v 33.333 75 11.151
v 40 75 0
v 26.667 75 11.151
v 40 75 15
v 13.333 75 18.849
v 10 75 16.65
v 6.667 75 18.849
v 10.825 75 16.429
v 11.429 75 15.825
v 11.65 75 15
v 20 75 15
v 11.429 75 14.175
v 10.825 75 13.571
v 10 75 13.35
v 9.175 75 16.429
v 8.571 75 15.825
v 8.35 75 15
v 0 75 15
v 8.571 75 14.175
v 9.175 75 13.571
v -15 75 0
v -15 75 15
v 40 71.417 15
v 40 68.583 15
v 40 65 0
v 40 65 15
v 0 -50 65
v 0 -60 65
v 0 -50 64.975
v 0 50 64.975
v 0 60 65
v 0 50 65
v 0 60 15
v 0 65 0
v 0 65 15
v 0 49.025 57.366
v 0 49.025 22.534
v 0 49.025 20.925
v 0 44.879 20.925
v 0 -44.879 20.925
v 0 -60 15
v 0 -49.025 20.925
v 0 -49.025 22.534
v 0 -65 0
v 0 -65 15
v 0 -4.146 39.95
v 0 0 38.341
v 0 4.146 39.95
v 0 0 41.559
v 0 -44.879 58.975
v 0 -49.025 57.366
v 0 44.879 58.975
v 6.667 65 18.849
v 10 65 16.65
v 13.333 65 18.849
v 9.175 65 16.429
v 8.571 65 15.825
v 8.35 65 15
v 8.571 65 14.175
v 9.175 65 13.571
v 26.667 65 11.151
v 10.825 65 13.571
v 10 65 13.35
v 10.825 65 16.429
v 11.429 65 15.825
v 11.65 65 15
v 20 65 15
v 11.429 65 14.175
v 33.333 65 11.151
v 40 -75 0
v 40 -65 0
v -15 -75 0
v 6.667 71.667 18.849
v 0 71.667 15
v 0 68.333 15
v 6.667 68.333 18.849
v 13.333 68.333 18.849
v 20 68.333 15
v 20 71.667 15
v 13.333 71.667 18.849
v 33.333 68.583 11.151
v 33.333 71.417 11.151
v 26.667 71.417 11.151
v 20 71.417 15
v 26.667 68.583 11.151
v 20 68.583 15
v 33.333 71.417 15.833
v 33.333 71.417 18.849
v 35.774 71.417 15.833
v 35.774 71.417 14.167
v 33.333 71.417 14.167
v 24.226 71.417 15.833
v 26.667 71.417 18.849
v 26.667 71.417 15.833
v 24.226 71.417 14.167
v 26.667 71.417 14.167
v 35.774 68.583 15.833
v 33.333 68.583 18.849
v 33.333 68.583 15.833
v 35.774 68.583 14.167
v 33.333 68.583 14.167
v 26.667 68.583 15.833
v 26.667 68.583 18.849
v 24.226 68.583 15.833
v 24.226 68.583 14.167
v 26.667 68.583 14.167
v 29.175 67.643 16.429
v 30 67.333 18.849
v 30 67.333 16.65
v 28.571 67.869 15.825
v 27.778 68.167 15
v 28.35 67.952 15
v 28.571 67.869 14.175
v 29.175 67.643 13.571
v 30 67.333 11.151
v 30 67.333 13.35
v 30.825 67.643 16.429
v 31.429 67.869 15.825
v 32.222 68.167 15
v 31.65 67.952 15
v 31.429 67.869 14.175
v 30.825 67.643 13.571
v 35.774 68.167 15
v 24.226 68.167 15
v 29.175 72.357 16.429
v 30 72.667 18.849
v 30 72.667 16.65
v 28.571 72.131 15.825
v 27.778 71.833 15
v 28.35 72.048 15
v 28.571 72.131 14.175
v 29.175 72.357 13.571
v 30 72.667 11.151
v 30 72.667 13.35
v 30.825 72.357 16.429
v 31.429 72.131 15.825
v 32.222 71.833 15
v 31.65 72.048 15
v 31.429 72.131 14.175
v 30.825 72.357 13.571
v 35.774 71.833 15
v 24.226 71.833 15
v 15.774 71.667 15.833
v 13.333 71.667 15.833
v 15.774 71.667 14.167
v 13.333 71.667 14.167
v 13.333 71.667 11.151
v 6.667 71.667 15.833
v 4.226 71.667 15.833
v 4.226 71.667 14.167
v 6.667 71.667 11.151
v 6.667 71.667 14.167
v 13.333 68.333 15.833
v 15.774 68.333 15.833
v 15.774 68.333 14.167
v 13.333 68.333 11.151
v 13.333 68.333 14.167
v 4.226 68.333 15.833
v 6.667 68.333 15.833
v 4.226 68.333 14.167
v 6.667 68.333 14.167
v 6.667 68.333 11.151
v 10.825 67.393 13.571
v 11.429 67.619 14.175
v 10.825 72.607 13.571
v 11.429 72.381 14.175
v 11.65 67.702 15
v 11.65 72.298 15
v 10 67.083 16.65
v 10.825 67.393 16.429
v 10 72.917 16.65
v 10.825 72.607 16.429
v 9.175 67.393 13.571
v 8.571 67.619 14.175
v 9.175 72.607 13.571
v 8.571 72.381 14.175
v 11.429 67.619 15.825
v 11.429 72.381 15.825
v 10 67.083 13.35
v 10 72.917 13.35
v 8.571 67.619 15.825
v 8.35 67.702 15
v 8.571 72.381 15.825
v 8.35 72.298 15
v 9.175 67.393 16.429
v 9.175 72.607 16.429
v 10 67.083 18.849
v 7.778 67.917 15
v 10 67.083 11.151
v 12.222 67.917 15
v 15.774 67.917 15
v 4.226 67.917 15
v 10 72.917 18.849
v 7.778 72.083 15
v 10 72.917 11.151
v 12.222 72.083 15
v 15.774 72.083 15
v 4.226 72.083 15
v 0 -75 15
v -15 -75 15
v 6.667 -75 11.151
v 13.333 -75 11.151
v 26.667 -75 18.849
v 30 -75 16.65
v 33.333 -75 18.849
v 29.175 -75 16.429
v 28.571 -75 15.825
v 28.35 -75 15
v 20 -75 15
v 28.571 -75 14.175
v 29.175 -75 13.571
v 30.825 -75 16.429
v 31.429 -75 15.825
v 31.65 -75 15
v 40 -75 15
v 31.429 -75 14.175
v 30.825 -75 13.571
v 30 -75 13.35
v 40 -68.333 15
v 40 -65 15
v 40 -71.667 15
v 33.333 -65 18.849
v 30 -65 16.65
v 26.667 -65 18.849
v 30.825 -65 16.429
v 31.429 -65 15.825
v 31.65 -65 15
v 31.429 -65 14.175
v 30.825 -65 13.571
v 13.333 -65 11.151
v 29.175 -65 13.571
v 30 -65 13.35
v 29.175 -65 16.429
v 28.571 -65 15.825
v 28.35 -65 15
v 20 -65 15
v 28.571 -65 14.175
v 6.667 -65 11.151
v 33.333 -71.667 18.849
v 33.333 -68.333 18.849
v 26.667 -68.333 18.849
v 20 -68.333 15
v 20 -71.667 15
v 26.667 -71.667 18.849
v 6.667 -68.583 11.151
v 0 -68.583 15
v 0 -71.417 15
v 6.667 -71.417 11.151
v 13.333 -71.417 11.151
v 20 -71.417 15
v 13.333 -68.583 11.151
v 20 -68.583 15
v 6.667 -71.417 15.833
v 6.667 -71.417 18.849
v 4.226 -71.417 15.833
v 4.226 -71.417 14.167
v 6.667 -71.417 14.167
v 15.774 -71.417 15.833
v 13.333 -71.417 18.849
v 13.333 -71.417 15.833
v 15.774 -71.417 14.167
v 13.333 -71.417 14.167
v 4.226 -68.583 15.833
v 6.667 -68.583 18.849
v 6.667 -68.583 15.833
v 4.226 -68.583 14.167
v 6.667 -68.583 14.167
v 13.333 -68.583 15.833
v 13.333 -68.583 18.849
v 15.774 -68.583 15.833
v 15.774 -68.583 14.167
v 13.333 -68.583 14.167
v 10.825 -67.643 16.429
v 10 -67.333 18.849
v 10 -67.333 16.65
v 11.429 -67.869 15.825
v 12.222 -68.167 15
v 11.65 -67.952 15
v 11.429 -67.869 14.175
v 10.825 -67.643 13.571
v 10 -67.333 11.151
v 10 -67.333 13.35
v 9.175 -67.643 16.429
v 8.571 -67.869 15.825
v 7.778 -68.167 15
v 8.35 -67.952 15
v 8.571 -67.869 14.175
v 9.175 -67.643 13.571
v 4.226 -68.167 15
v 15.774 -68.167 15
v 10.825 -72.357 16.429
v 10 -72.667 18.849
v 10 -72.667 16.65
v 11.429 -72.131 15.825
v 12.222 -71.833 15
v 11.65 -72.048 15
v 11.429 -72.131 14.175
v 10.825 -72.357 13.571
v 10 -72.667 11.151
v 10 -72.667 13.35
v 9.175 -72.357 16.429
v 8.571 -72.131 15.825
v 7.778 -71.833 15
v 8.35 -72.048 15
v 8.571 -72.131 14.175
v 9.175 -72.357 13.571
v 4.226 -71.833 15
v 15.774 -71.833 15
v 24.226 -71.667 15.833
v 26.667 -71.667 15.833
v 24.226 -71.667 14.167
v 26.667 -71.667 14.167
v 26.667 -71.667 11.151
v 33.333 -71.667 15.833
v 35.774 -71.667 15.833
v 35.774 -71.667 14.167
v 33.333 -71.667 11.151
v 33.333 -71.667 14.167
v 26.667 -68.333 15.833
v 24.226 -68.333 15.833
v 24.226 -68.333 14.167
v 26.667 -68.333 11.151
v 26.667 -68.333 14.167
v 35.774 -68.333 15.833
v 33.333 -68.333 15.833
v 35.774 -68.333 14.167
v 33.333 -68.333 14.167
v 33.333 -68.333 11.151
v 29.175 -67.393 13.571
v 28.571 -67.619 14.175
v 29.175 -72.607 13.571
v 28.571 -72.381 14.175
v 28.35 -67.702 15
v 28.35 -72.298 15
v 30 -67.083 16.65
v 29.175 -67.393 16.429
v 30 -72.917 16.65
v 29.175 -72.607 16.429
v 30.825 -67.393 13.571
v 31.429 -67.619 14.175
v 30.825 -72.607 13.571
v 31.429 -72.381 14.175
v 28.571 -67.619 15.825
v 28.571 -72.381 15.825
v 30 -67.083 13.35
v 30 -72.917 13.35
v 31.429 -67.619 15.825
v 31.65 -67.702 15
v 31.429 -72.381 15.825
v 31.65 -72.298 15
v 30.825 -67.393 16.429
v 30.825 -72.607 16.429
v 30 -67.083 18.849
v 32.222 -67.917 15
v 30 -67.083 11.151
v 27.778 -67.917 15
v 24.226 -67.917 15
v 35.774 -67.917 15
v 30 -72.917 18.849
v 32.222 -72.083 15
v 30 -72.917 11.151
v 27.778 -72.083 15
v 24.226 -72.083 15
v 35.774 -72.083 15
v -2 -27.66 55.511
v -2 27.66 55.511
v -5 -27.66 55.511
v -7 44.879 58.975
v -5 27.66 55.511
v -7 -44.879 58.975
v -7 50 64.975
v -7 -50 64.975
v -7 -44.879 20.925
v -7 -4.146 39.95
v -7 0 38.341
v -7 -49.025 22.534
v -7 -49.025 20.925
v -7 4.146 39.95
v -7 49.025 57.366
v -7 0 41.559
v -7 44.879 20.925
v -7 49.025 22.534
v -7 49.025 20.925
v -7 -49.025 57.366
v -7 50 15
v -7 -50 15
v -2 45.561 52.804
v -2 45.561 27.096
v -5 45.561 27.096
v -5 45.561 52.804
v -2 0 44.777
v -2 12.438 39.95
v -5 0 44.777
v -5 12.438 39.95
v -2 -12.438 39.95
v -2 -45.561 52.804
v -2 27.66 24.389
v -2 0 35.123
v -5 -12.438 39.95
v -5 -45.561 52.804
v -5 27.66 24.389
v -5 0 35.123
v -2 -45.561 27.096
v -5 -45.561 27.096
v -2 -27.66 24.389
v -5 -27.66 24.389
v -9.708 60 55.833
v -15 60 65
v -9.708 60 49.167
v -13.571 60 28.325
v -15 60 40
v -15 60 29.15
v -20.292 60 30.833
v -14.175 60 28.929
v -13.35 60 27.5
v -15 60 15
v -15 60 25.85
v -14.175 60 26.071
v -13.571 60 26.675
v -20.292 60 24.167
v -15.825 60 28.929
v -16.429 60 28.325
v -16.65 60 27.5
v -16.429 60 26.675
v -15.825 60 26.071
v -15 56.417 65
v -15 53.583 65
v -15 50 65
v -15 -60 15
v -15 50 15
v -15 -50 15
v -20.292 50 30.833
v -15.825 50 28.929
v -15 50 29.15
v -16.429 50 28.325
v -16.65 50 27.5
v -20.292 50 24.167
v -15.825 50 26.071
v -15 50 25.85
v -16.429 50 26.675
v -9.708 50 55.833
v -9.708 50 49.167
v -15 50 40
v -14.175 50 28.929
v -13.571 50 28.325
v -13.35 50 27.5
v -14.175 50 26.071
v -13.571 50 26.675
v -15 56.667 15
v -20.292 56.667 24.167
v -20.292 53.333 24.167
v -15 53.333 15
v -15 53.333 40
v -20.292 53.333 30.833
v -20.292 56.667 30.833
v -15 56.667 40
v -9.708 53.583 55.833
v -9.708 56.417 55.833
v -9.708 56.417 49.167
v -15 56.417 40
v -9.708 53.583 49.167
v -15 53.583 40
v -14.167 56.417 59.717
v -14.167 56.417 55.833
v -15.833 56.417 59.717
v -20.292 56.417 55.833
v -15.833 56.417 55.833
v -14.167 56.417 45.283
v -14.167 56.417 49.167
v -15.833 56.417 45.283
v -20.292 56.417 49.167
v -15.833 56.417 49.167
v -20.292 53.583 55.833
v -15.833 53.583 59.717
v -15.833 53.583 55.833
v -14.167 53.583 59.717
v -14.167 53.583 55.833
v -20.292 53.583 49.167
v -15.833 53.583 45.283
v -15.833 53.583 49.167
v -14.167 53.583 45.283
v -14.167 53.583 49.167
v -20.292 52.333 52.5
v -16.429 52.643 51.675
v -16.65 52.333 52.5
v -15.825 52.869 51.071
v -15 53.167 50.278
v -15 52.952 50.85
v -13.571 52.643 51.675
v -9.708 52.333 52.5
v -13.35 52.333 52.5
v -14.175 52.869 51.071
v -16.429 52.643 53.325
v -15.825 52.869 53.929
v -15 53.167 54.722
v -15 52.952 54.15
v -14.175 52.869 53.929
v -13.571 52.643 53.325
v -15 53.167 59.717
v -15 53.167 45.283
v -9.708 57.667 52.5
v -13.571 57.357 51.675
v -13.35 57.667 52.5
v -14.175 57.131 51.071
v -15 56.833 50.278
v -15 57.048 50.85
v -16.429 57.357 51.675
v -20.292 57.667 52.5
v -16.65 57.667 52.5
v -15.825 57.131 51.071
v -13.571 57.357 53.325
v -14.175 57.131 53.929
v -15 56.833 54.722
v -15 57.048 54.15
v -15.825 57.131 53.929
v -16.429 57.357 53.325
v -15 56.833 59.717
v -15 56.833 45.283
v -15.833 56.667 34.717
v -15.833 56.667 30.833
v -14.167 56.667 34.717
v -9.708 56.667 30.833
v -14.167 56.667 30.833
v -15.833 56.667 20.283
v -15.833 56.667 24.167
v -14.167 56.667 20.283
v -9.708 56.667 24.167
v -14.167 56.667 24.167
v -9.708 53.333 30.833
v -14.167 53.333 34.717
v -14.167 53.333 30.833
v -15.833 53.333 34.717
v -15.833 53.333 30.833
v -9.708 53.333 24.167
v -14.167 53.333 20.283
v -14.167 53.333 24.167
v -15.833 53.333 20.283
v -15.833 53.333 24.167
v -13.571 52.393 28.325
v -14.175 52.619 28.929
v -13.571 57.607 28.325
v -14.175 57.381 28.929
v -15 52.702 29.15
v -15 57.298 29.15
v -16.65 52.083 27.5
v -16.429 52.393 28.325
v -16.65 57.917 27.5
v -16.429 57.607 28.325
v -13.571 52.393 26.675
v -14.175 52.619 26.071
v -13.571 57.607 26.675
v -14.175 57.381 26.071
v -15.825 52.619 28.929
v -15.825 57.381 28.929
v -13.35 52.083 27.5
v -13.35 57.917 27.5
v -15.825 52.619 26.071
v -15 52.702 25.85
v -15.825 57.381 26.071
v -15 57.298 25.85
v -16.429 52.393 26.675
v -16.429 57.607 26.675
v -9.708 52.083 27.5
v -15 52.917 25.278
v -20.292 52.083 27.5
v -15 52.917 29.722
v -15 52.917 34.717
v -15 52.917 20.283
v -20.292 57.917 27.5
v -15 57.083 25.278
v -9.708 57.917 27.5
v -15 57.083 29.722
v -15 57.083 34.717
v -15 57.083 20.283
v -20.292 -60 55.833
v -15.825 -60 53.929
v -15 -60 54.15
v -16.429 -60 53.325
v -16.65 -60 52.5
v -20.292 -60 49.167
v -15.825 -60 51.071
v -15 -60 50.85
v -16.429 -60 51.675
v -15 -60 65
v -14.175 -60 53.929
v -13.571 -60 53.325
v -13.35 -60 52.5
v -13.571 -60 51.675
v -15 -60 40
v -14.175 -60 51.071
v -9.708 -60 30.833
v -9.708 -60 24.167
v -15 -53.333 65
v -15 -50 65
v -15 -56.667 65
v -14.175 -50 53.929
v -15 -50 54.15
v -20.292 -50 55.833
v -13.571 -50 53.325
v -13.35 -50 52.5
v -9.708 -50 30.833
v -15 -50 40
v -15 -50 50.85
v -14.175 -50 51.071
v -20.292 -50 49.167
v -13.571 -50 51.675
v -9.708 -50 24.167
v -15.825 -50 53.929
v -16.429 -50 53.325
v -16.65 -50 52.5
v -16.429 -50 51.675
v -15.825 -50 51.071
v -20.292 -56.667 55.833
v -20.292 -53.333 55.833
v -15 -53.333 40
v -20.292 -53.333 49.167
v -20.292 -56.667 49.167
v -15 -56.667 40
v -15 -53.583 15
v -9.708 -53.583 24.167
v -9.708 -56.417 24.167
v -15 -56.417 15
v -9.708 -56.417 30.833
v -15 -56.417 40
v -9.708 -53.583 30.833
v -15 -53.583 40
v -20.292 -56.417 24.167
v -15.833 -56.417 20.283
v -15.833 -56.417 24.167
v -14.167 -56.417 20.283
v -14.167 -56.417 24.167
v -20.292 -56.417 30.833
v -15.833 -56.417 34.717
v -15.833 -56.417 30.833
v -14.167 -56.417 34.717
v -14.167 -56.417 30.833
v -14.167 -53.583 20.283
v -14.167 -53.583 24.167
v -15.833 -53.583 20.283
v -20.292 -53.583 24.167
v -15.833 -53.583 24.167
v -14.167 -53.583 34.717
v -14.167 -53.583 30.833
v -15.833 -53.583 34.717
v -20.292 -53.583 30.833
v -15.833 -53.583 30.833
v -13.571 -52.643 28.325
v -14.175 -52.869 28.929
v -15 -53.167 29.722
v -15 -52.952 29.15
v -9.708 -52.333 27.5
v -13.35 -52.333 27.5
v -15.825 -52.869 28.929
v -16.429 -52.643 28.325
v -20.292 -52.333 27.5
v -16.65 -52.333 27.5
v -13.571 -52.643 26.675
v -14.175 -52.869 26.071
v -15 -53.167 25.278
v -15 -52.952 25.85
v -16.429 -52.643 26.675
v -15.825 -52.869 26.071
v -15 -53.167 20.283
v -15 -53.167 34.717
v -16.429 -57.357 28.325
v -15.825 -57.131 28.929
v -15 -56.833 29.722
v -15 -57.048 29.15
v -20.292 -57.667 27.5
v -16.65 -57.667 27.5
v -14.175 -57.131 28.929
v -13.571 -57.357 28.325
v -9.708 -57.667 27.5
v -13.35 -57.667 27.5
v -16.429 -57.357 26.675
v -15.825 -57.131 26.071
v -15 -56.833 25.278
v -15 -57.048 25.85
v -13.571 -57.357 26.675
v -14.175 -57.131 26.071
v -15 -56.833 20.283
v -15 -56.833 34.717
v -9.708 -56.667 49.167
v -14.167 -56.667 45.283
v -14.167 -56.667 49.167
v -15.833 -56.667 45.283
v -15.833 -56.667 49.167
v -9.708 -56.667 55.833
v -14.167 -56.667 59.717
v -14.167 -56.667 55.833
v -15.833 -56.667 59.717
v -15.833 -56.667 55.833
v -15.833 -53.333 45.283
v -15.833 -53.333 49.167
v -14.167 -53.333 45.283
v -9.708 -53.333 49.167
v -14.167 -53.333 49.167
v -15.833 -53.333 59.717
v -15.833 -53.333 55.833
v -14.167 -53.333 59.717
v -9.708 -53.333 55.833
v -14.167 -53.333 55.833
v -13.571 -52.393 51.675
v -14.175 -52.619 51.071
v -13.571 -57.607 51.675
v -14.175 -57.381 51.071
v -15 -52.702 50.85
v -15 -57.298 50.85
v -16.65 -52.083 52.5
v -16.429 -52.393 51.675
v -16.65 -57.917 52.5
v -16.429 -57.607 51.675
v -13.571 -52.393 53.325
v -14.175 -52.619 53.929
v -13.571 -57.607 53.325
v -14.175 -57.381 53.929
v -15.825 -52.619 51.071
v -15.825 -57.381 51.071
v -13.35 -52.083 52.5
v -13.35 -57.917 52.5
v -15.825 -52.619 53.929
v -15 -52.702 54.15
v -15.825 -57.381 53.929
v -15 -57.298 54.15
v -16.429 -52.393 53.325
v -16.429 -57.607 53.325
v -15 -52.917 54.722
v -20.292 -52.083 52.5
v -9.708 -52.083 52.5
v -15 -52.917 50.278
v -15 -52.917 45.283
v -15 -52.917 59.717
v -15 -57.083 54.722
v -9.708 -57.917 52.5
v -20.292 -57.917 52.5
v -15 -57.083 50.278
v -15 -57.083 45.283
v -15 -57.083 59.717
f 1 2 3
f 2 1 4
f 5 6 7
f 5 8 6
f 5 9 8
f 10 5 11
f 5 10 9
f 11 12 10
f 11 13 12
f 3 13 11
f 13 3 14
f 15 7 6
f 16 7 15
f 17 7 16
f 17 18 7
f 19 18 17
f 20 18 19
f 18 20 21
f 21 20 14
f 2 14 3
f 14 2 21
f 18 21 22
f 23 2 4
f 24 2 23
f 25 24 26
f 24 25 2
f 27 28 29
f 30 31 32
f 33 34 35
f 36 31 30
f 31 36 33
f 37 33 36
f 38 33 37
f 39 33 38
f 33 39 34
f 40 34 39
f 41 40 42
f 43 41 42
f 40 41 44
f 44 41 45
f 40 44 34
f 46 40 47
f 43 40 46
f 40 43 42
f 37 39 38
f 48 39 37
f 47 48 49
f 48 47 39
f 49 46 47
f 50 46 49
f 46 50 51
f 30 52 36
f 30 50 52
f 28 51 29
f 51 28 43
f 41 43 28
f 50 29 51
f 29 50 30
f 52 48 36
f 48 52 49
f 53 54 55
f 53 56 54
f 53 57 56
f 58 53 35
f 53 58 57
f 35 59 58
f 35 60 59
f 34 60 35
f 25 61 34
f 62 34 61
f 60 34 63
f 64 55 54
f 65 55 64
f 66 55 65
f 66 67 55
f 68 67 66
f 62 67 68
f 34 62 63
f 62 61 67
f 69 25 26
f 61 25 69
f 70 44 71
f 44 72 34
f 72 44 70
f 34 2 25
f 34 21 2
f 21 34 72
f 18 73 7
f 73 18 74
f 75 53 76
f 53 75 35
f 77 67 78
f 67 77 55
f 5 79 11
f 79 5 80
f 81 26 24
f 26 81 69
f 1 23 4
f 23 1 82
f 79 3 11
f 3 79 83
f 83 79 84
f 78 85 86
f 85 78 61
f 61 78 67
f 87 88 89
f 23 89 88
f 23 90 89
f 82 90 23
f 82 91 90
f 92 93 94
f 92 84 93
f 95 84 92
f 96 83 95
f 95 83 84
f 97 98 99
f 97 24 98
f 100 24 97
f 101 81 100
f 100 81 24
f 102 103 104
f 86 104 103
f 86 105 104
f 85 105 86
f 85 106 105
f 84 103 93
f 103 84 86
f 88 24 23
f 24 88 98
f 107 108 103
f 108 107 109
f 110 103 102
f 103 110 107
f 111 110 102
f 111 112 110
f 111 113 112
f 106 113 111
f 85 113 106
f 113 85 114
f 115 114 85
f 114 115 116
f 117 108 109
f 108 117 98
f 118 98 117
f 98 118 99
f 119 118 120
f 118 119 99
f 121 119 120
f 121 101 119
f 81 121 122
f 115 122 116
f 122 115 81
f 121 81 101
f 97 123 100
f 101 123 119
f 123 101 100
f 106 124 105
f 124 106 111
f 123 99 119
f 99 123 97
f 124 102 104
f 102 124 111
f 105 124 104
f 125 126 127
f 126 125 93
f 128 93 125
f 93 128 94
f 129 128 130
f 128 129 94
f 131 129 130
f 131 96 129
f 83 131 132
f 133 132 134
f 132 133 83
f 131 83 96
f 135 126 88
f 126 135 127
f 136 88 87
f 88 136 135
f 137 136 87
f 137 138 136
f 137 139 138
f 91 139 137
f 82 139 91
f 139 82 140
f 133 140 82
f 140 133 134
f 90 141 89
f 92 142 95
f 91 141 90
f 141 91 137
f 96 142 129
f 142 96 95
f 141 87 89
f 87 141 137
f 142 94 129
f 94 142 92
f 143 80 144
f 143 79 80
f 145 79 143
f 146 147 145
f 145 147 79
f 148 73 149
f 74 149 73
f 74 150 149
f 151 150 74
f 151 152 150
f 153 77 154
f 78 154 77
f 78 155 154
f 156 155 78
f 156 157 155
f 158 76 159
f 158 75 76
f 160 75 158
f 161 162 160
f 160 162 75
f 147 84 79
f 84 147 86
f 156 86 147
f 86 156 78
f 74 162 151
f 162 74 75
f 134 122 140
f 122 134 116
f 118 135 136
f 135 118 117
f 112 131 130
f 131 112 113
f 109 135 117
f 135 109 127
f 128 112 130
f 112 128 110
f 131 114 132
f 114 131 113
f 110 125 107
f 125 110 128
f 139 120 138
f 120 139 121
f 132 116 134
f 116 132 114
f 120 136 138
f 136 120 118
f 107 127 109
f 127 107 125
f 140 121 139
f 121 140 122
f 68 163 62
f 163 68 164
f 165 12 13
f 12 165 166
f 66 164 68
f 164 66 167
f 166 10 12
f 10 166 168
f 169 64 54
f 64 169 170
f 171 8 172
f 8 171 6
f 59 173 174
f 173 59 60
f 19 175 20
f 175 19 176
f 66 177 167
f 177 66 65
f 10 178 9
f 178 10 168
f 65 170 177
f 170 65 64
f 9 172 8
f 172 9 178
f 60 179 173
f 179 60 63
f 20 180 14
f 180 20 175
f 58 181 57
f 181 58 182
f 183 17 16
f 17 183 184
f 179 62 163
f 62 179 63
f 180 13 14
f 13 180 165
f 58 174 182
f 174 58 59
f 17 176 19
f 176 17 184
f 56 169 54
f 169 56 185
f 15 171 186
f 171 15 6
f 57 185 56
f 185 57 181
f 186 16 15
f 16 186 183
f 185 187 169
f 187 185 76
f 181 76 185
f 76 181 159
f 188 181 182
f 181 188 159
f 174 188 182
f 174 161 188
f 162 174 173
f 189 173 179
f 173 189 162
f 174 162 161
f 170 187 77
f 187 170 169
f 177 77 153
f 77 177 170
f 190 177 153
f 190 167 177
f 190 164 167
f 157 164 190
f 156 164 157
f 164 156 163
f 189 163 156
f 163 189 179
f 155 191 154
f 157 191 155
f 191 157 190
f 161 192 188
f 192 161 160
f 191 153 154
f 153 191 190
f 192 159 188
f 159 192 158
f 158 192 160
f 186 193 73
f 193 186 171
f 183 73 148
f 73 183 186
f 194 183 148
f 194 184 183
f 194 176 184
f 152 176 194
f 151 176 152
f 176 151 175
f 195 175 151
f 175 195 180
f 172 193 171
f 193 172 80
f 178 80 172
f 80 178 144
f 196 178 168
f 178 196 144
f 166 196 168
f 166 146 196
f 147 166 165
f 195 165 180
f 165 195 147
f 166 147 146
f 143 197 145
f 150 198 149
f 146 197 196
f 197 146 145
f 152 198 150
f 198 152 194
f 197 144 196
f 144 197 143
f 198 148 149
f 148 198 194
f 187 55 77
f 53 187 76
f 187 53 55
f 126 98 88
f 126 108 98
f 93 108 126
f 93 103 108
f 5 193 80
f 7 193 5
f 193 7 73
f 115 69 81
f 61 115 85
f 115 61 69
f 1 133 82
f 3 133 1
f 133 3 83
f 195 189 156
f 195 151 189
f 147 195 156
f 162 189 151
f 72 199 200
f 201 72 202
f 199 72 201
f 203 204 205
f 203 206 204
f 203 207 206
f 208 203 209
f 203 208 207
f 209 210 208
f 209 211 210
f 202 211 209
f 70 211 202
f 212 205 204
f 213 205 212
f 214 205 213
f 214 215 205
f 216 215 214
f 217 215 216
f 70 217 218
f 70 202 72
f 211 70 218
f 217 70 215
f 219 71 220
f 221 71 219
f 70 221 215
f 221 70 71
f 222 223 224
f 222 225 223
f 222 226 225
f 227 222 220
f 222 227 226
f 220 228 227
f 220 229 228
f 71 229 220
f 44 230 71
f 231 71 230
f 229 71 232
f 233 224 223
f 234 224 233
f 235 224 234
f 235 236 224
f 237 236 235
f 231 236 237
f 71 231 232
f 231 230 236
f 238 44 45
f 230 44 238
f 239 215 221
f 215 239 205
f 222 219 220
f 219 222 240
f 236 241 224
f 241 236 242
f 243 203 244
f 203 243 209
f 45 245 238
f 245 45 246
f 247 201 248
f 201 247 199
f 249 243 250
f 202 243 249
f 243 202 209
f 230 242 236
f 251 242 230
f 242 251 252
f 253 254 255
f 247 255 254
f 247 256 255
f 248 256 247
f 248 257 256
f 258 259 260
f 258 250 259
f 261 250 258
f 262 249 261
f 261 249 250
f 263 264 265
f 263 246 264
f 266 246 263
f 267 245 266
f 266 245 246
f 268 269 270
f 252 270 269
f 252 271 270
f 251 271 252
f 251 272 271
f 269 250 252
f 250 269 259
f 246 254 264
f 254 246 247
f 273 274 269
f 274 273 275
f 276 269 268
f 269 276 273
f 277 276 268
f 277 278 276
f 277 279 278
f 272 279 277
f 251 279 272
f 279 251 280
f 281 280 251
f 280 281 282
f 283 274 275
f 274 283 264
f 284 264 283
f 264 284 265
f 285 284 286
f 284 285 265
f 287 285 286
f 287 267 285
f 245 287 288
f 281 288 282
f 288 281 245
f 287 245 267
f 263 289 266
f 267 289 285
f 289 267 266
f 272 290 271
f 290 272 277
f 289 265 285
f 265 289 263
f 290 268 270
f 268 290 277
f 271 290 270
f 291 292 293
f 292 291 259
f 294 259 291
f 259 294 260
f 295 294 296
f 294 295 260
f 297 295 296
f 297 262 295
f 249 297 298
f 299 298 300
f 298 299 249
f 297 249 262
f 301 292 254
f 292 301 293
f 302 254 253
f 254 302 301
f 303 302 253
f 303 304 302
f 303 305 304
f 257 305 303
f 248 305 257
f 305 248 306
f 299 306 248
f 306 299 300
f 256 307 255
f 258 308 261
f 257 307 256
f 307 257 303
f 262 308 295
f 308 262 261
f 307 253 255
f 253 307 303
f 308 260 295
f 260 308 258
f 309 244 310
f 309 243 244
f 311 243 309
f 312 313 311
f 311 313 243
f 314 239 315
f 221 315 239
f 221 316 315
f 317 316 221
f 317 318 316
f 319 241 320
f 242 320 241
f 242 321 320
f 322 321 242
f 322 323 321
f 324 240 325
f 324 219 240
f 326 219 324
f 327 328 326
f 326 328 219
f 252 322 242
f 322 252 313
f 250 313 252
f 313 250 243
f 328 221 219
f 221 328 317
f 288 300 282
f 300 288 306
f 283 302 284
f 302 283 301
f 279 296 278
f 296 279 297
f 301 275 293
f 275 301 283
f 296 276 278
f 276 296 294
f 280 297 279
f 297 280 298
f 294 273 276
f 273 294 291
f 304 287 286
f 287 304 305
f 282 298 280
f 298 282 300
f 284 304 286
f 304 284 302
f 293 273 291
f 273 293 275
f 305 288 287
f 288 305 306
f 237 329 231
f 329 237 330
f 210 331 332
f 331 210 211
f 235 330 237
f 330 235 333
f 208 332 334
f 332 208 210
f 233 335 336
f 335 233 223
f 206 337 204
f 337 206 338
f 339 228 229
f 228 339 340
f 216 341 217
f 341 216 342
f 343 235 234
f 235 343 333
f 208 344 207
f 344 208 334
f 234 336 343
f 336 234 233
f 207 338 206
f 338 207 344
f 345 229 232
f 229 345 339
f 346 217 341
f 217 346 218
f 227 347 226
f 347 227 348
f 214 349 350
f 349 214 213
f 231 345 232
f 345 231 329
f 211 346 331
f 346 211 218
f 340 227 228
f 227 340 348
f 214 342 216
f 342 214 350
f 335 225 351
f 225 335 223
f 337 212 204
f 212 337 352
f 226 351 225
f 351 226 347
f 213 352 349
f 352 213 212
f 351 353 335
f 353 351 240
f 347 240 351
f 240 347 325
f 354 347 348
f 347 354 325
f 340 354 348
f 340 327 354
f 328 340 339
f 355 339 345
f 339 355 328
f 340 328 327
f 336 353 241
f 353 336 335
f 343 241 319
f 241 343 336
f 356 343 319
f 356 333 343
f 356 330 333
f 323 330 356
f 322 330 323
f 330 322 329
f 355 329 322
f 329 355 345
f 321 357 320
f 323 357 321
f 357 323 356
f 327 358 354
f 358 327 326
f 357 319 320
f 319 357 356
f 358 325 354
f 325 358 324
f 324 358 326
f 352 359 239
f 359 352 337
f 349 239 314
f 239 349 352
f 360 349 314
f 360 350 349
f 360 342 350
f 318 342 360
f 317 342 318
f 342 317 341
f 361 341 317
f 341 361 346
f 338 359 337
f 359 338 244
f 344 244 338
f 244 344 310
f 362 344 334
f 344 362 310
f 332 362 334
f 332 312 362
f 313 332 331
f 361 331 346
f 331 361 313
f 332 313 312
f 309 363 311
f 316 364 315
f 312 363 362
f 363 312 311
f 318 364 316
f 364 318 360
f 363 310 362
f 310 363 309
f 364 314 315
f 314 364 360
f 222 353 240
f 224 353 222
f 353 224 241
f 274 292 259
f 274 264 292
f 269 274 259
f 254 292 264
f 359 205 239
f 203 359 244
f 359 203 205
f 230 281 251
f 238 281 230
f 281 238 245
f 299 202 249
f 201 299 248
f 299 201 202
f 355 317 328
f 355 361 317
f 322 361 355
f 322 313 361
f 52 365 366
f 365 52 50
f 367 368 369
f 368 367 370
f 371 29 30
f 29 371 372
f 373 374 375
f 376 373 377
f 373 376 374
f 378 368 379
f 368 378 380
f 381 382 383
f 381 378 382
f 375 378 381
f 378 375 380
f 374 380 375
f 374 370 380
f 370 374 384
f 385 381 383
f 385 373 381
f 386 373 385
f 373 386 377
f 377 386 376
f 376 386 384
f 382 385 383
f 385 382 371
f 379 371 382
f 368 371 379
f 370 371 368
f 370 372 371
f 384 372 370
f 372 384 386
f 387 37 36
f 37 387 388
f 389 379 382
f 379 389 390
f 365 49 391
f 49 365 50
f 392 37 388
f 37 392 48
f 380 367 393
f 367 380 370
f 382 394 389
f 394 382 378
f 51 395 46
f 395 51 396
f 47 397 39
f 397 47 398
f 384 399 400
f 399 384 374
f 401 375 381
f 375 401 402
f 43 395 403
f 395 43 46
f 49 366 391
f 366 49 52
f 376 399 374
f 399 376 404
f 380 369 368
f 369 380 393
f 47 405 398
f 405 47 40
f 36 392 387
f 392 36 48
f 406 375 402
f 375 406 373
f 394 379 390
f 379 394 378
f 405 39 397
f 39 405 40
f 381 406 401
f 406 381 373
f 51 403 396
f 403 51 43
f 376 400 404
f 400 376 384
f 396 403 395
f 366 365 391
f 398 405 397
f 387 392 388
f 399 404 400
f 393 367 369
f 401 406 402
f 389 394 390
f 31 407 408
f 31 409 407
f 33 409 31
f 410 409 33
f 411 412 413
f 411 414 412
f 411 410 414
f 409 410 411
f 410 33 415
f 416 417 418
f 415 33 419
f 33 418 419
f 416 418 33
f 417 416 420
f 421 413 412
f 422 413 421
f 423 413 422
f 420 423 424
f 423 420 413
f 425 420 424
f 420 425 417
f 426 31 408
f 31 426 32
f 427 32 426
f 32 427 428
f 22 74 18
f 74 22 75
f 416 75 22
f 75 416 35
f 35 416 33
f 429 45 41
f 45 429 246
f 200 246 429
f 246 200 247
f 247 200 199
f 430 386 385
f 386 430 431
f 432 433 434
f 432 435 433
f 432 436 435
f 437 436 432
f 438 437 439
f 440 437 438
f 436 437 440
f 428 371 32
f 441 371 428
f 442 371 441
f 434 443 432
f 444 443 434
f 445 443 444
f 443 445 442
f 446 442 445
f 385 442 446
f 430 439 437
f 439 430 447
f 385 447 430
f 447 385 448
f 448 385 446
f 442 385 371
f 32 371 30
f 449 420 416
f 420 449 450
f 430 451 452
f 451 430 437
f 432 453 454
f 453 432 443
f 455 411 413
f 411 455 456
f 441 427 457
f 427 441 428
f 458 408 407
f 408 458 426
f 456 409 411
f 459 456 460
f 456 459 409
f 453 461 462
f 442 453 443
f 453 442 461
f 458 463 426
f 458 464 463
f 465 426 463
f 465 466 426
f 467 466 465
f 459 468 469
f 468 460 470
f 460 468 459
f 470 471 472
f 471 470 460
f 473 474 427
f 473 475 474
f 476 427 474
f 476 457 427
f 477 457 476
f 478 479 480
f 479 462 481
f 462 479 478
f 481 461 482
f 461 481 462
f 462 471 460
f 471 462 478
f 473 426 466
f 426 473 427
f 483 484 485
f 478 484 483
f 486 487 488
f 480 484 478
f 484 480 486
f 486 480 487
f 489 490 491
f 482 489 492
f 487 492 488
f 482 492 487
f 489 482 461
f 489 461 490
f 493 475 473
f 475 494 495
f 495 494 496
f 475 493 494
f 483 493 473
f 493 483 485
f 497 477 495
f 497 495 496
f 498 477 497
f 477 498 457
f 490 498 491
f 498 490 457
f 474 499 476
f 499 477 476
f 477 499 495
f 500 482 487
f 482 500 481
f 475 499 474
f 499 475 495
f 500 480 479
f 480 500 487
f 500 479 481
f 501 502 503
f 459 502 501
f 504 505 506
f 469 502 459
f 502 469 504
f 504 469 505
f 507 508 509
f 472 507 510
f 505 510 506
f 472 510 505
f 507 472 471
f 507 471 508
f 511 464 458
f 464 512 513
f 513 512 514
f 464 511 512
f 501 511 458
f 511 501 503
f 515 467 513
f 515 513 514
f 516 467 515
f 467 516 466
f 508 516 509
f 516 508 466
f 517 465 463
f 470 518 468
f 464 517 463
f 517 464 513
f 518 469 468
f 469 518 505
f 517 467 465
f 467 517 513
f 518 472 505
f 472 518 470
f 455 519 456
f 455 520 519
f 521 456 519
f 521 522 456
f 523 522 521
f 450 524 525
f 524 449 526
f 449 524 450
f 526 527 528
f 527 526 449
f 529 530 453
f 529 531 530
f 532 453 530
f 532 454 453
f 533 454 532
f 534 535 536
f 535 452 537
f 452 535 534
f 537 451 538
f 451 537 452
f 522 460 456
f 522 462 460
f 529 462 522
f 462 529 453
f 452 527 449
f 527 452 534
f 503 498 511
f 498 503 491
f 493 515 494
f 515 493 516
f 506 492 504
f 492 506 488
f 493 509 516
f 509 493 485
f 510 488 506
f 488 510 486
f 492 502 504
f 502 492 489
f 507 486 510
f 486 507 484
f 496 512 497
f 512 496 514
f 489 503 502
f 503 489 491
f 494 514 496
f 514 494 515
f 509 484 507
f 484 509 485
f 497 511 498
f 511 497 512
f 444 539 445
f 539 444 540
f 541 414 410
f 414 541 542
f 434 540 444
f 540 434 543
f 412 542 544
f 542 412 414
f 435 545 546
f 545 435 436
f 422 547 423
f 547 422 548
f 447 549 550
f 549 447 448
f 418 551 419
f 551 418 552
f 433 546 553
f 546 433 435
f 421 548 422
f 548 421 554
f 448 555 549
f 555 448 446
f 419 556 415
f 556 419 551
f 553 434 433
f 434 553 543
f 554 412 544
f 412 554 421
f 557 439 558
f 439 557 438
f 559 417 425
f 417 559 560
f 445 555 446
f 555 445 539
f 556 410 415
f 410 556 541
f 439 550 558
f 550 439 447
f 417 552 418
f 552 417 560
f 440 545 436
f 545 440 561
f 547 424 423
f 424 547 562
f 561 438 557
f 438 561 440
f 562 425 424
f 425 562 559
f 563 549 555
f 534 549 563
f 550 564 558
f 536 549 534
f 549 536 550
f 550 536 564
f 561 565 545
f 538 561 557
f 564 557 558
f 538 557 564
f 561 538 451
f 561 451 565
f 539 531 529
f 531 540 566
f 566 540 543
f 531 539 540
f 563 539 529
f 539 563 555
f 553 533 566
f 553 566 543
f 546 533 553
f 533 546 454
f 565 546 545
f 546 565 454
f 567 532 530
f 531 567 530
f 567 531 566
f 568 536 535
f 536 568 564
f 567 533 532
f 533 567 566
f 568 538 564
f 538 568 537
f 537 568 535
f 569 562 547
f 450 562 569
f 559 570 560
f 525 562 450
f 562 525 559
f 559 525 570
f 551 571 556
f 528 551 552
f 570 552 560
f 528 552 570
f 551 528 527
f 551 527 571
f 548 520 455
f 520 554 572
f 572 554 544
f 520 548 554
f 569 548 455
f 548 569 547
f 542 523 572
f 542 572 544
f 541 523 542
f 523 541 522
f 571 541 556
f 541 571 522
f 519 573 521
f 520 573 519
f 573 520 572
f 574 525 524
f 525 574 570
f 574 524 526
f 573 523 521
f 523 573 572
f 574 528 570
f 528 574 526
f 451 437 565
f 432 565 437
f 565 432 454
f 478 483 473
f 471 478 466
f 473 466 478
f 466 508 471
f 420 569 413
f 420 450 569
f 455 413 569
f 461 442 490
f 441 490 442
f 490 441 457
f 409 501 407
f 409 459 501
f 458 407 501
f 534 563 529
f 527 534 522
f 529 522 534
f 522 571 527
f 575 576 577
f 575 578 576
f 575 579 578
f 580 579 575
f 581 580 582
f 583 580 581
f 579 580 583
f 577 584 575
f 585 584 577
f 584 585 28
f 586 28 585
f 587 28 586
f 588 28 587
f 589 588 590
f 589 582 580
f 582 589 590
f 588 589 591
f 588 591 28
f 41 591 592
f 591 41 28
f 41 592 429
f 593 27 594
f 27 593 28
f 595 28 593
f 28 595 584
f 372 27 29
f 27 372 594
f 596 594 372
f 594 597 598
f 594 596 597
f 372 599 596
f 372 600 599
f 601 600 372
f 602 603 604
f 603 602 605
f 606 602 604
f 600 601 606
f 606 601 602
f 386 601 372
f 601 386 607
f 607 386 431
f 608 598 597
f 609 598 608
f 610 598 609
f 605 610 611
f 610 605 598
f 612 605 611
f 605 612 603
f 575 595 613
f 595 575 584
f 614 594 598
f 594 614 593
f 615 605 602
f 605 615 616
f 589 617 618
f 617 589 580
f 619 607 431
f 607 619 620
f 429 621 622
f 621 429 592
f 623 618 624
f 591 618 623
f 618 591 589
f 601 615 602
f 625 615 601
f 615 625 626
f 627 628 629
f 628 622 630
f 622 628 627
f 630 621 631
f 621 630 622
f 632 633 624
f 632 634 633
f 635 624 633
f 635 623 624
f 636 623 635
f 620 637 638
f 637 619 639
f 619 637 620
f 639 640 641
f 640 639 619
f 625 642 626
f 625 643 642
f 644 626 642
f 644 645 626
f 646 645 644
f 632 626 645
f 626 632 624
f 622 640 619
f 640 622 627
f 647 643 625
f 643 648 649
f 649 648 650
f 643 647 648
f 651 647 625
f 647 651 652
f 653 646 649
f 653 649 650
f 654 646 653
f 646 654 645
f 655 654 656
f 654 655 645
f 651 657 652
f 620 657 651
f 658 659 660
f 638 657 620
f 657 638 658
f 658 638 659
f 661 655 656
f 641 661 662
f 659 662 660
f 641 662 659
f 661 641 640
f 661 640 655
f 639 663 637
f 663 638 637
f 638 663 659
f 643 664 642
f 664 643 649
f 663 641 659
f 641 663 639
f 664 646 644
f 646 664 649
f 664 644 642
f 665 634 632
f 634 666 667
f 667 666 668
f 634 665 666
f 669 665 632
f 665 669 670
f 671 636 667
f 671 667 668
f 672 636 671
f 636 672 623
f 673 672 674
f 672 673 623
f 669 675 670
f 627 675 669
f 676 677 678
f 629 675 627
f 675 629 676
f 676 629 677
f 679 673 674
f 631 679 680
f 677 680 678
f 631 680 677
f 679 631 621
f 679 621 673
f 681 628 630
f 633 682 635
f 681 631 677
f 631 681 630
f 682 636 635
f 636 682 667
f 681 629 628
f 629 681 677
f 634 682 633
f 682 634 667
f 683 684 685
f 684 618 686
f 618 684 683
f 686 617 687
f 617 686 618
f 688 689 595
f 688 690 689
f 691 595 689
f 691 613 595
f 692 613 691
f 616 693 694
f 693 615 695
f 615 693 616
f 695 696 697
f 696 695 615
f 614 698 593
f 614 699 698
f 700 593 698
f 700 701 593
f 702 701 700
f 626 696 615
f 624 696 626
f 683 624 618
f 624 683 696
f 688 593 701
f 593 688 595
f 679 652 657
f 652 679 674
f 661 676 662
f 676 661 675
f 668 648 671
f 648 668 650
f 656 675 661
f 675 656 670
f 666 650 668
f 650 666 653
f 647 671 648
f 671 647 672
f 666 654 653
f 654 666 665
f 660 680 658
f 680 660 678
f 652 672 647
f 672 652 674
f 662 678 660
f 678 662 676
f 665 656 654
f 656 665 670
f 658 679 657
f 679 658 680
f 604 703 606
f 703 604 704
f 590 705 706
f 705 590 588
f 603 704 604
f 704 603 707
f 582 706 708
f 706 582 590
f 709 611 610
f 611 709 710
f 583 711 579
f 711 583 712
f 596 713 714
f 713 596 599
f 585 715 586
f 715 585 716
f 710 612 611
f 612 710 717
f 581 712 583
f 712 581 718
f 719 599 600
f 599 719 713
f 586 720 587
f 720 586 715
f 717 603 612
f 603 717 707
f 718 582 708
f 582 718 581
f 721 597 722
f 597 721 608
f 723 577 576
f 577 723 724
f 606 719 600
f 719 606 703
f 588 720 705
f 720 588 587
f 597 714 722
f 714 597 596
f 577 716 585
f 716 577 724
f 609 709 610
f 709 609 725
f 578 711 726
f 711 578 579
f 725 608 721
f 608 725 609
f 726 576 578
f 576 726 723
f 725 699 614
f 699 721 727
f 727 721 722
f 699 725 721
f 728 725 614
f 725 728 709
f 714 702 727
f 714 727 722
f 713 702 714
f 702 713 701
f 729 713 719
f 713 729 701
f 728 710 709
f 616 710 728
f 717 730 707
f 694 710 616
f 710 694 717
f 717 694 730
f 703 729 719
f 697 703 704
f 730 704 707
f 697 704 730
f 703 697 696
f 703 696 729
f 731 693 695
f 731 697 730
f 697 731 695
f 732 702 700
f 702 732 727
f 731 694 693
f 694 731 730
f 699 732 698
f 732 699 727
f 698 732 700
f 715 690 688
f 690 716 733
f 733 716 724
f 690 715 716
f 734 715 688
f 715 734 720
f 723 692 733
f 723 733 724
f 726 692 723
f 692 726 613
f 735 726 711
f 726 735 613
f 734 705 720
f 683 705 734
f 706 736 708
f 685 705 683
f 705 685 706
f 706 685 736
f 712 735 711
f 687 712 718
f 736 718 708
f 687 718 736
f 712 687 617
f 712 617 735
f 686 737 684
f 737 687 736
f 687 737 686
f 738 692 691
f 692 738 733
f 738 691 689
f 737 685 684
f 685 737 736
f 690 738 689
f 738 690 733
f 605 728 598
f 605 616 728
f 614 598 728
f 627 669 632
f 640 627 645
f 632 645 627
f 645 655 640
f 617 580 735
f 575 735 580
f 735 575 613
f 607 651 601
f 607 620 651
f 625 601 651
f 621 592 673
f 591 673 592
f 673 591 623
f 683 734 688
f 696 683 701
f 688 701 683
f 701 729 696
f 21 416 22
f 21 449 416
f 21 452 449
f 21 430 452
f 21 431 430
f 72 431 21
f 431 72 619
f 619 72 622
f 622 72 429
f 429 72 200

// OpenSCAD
// file: joiners.scad
include <config.scad>
use <GDMUtils.scad>


module joiner(h=40, w=10, l=10, a=30, screwsize=3, guides=true, slop=printer_slop)
{
	dmnd_height = h/2;
	dmnd_width = dmnd_height*tan(a);
	guide_size = w/3;
	tip_off = 2+dmnd_width/2-guide_size*tan(a);

	render(convexity=4) union() {
		difference() {
			union() {
				// Make base.
				difference() {
					union() {
						translate([0,-l/2,0]) cube(size=[w, l, h], center=true);
						translate([0,0,-h/4])
							scale([w, dmnd_width/2, dmnd_height/2])
								xrot(45) cube(size=[1,sqrt(2),sqrt(2)], center=true);
					}
					translate([0,0,h/4])
						scale([w*1.1, dmnd_width/2, dmnd_height/2])
							xrot(45) cube(size=[1,sqrt(2),sqrt(2)], center=true);
				}

				// Make tab
				translate([0,0,dmnd_height/2]) {
					translate([0, -dmnd_width/4, 0])
						cube(size=[w/3-slop*2, dmnd_width/2, dmnd_height], center=true);
					scale([w/3-slop*2, dmnd_width/2, dmnd_height/2]) xrot(45)
						cube(size=[1,sqrt(2),sqrt(2)], center=true);
				}

				// Guide ridges.
				if (guides == true) {
					translate([0,0,dmnd_height/2]) {
						grid_of(xa=[-(w/6-slop), (w/6-slop)]) {
							// Guide ridge.
							scale([0.75, 1, 2]) yrot(45)
								cube(size=[guide_size/sqrt(2), dmnd_width, guide_size/sqrt(2)], center=true);

							// Snap ridge.
							scale([0.25, 0.5, 1]) zrot(45)
								cube(size=[guide_size/sqrt(2), guide_size/sqrt(2), dmnd_width], center=true);
						}
					}
				}
			}

			// Make slot
			translate([0, 0, -dmnd_height/2]) {
				translate([0, dmnd_width/4, 0])
					cube(size=[w/3, dmnd_width/2, dmnd_height], center=true);
				scale([w/3, dmnd_width/2, dmnd_height/2]) xrot(45)
					cube(size=[1,sqrt(2),sqrt(2)], center=true);
			}

			// Blunt point of tab.
			translate([0,tip_off,0])
				cube(size=[w*1.1,4,h], center=true);

			// Make screwholes, if needed.
			if (screwsize != undef) {
				xrot_copies([0, 180])
					translate([0, 0, dmnd_height/2])
						yrot(90) cylinder(r=screwsize*1.1/2, h=w+1, center=true, $fn=12);
			}

			// Guide slots.
			if (guides == true) {
				translate([0,0,-dmnd_height/2]) {
					grid_of(xa=[-(w/6),(w/6)]) {
						// Guide slot
						scale([0.75, 1, 2]) yrot(45)
							cube(size=[guide_size/sqrt(2), dmnd_width*1.1, guide_size/sqrt(2)], center=true);

						// Snap hole
						scale([0.25, 0.5, 1]) zrot(45)
							cube(size=[guide_size/sqrt(2), guide_size/sqrt(2), dmnd_width], center=true);
					}
				}
			}
		}

		// Blunt point of slot.
		translate([0,-tip_off,0])
			cube(size=[w,4,h], center=true);
	}
}
//joiner(screwsize=3);



module joiner_clear(h=40, w=10, a=30)
{
	dmnd_height = h/2;
	dmnd_width = dmnd_height*tan(a);
	guide_size = w/3;
	tip_off = 2+dmnd_width/2-guide_size*tan(a);

	difference() {
		// Diamonds.
		grid_of(za=[-h/4,h/4]) {
			scale([w+10, dmnd_width/2, dmnd_height/2]) {
				xrot(45) cube(size=[1,sqrt(2),sqrt(2)], center=true);
			}
		}
		// Blunt point of tab.
		grid_of(ya=[-tip_off, tip_off]) {
			cube(size=[w+10+1, 4, h], center=true);
		}
	}
}
//joiner_clear();



module joiner_pair(spacing=100, h=40, w=10, l=10, a=30, screwsize=3, guides=true)
{
	yrot_copies([0,180]) {
		translate([spacing/2, 0, 0]) {
			joiner(h=h, w=w, l=l, a=a, screwsize=screwsize, guides=guides);
		}
	}
}



module joiner_pair_clear(spacing=100, h=40, w=10, a=30)
{
	yrot_copies([0,180]) {
		translate([spacing/2, 0, 0]) {
			joiner_clear(h=h, w=w, a=a);
		}
	}
}



module joiner_quad(xspacing=100, yspacing=50, h=40, w=10, l=10, a=30, screwsize=3, guides=true)
{
	zrot_copies([0,180]) {
		translate([0, yspacing/2, 0]) {
			joiner_pair(spacing=xspacing, h=h, w=w, l=l, a=a, screwsize=screwsize, guides=guides);
		}
	}
}



module joiner_quad_clear(xspacing=100, yspacing=50, h=40, w=10, a=30)
{
	zrot_copies([0,180]) {
		translate([0, yspacing/2, 0]) {
			joiner_pair_clear(spacing=xspacing, h=h, w=w, a=a);
		}
	}
}



// vim: noexpandtab tabstop=4 shiftwidth=4 softtabstop=4 nowrap
// file: config.scad
snappy_version = 0.90;


platform_length = 110; // mm.  Must be a multiple of rack_tooth_size.
platform_width  = 150; // mm
platform_height =  40; // mm
platform_thick  =   7; // mm

rail_length  = 150;    // mm
rail_height  =  50;    // mm
rail_thick   =   7;    // mm

motor_rail_length = 100; // mm

roller_thick =  12;    // mm
roller_diam  =  30;    // mm
roller_axle  =  15;    // mm
roller_base  =  12;    // mm
roller_angle =  30;    // degrees

joiner_angle =  30;    // degrees
joiner_width =  10;    // mm

rack_tooth_size  =  5; // mm per tooth.
set_screw_size   =  3; // mm size of set screw in drive gears, couplers, etc
motor_shaft_size =  5; // mm
motor_shaft_flatted = false;  // boolean

// Currently configured for 3/8" ACME threaded rod and matching 11/16" nut
lifter_rod_diam   =   9.5; // mm
lifter_rod_length = 300.0; // mm
lifter_nut_size   =  17.4; // mm
lifter_nut_thick  =   9.3; // mm
lifter_thread_size =  3.175; // mm lift per revolution

// This is the slop needed to make parts fit more exactly, and may be
// printer dependant.  Printing a slop calibration plate should help
// dial this setting in for your printer.
printer_slop =   0.25; // mm



// Commonly used derived values.  Don't change these.
rail_spacing = platform_width - joiner_width*4 - 10;
roller_spacing = rail_spacing-roller_diam+0.5;
rail_width = rail_spacing + joiner_width*2;



// vim: noexpandtab tabstop=4 shiftwidth=4 softtabstop=4 nowrap
// main file
include <config.scad>
use <GDMUtils.scad>
use <joiners.scad>


module z_platform_joint()
{
	joiner_length=15;
	color("Chocolate") xrot(-90) union() {
		// Top hanger snap-tab joiners.
		translate([0,0,platform_height/2]) {
			joiner_pair(spacing=platform_width-joiner_width, h=platform_height, w=joiner_width, l=joiner_length, a=joiner_angle);
		}

		// Bottom strut
		translate([0, -joiner_length/2, -joiner_length/2])
			cube(size=[platform_width, joiner_length, joiner_length], center=true);

		// Back wall.
		translate([0, rail_height/2-0.05, -platform_thick/2]) xrot(90) zrot(90) {
			thinning_wall(h=rail_height+0.05, l=rail_width-joiner_width+0.05, thick=platform_thick, strut=6);
		}

		translate([0, rail_height/2, -joiner_length]) {
			xrot(-90) joiner_pair(spacing=rail_width-joiner_width, h=rail_height, w=joiner_width, l=joiner_length, a=joiner_angle);
		}
	}
}
//!z_platform_joint();



module z_platform_joint_part() { // make me
	translate([0, 0, 15]) zrot(90) xrot(180) {
		z_platform_joint();
	}
}



z_platform_joint_part();



// vim: noexpandtab tabstop=4 shiftwidth=4 softtabstop=4 nowrap
